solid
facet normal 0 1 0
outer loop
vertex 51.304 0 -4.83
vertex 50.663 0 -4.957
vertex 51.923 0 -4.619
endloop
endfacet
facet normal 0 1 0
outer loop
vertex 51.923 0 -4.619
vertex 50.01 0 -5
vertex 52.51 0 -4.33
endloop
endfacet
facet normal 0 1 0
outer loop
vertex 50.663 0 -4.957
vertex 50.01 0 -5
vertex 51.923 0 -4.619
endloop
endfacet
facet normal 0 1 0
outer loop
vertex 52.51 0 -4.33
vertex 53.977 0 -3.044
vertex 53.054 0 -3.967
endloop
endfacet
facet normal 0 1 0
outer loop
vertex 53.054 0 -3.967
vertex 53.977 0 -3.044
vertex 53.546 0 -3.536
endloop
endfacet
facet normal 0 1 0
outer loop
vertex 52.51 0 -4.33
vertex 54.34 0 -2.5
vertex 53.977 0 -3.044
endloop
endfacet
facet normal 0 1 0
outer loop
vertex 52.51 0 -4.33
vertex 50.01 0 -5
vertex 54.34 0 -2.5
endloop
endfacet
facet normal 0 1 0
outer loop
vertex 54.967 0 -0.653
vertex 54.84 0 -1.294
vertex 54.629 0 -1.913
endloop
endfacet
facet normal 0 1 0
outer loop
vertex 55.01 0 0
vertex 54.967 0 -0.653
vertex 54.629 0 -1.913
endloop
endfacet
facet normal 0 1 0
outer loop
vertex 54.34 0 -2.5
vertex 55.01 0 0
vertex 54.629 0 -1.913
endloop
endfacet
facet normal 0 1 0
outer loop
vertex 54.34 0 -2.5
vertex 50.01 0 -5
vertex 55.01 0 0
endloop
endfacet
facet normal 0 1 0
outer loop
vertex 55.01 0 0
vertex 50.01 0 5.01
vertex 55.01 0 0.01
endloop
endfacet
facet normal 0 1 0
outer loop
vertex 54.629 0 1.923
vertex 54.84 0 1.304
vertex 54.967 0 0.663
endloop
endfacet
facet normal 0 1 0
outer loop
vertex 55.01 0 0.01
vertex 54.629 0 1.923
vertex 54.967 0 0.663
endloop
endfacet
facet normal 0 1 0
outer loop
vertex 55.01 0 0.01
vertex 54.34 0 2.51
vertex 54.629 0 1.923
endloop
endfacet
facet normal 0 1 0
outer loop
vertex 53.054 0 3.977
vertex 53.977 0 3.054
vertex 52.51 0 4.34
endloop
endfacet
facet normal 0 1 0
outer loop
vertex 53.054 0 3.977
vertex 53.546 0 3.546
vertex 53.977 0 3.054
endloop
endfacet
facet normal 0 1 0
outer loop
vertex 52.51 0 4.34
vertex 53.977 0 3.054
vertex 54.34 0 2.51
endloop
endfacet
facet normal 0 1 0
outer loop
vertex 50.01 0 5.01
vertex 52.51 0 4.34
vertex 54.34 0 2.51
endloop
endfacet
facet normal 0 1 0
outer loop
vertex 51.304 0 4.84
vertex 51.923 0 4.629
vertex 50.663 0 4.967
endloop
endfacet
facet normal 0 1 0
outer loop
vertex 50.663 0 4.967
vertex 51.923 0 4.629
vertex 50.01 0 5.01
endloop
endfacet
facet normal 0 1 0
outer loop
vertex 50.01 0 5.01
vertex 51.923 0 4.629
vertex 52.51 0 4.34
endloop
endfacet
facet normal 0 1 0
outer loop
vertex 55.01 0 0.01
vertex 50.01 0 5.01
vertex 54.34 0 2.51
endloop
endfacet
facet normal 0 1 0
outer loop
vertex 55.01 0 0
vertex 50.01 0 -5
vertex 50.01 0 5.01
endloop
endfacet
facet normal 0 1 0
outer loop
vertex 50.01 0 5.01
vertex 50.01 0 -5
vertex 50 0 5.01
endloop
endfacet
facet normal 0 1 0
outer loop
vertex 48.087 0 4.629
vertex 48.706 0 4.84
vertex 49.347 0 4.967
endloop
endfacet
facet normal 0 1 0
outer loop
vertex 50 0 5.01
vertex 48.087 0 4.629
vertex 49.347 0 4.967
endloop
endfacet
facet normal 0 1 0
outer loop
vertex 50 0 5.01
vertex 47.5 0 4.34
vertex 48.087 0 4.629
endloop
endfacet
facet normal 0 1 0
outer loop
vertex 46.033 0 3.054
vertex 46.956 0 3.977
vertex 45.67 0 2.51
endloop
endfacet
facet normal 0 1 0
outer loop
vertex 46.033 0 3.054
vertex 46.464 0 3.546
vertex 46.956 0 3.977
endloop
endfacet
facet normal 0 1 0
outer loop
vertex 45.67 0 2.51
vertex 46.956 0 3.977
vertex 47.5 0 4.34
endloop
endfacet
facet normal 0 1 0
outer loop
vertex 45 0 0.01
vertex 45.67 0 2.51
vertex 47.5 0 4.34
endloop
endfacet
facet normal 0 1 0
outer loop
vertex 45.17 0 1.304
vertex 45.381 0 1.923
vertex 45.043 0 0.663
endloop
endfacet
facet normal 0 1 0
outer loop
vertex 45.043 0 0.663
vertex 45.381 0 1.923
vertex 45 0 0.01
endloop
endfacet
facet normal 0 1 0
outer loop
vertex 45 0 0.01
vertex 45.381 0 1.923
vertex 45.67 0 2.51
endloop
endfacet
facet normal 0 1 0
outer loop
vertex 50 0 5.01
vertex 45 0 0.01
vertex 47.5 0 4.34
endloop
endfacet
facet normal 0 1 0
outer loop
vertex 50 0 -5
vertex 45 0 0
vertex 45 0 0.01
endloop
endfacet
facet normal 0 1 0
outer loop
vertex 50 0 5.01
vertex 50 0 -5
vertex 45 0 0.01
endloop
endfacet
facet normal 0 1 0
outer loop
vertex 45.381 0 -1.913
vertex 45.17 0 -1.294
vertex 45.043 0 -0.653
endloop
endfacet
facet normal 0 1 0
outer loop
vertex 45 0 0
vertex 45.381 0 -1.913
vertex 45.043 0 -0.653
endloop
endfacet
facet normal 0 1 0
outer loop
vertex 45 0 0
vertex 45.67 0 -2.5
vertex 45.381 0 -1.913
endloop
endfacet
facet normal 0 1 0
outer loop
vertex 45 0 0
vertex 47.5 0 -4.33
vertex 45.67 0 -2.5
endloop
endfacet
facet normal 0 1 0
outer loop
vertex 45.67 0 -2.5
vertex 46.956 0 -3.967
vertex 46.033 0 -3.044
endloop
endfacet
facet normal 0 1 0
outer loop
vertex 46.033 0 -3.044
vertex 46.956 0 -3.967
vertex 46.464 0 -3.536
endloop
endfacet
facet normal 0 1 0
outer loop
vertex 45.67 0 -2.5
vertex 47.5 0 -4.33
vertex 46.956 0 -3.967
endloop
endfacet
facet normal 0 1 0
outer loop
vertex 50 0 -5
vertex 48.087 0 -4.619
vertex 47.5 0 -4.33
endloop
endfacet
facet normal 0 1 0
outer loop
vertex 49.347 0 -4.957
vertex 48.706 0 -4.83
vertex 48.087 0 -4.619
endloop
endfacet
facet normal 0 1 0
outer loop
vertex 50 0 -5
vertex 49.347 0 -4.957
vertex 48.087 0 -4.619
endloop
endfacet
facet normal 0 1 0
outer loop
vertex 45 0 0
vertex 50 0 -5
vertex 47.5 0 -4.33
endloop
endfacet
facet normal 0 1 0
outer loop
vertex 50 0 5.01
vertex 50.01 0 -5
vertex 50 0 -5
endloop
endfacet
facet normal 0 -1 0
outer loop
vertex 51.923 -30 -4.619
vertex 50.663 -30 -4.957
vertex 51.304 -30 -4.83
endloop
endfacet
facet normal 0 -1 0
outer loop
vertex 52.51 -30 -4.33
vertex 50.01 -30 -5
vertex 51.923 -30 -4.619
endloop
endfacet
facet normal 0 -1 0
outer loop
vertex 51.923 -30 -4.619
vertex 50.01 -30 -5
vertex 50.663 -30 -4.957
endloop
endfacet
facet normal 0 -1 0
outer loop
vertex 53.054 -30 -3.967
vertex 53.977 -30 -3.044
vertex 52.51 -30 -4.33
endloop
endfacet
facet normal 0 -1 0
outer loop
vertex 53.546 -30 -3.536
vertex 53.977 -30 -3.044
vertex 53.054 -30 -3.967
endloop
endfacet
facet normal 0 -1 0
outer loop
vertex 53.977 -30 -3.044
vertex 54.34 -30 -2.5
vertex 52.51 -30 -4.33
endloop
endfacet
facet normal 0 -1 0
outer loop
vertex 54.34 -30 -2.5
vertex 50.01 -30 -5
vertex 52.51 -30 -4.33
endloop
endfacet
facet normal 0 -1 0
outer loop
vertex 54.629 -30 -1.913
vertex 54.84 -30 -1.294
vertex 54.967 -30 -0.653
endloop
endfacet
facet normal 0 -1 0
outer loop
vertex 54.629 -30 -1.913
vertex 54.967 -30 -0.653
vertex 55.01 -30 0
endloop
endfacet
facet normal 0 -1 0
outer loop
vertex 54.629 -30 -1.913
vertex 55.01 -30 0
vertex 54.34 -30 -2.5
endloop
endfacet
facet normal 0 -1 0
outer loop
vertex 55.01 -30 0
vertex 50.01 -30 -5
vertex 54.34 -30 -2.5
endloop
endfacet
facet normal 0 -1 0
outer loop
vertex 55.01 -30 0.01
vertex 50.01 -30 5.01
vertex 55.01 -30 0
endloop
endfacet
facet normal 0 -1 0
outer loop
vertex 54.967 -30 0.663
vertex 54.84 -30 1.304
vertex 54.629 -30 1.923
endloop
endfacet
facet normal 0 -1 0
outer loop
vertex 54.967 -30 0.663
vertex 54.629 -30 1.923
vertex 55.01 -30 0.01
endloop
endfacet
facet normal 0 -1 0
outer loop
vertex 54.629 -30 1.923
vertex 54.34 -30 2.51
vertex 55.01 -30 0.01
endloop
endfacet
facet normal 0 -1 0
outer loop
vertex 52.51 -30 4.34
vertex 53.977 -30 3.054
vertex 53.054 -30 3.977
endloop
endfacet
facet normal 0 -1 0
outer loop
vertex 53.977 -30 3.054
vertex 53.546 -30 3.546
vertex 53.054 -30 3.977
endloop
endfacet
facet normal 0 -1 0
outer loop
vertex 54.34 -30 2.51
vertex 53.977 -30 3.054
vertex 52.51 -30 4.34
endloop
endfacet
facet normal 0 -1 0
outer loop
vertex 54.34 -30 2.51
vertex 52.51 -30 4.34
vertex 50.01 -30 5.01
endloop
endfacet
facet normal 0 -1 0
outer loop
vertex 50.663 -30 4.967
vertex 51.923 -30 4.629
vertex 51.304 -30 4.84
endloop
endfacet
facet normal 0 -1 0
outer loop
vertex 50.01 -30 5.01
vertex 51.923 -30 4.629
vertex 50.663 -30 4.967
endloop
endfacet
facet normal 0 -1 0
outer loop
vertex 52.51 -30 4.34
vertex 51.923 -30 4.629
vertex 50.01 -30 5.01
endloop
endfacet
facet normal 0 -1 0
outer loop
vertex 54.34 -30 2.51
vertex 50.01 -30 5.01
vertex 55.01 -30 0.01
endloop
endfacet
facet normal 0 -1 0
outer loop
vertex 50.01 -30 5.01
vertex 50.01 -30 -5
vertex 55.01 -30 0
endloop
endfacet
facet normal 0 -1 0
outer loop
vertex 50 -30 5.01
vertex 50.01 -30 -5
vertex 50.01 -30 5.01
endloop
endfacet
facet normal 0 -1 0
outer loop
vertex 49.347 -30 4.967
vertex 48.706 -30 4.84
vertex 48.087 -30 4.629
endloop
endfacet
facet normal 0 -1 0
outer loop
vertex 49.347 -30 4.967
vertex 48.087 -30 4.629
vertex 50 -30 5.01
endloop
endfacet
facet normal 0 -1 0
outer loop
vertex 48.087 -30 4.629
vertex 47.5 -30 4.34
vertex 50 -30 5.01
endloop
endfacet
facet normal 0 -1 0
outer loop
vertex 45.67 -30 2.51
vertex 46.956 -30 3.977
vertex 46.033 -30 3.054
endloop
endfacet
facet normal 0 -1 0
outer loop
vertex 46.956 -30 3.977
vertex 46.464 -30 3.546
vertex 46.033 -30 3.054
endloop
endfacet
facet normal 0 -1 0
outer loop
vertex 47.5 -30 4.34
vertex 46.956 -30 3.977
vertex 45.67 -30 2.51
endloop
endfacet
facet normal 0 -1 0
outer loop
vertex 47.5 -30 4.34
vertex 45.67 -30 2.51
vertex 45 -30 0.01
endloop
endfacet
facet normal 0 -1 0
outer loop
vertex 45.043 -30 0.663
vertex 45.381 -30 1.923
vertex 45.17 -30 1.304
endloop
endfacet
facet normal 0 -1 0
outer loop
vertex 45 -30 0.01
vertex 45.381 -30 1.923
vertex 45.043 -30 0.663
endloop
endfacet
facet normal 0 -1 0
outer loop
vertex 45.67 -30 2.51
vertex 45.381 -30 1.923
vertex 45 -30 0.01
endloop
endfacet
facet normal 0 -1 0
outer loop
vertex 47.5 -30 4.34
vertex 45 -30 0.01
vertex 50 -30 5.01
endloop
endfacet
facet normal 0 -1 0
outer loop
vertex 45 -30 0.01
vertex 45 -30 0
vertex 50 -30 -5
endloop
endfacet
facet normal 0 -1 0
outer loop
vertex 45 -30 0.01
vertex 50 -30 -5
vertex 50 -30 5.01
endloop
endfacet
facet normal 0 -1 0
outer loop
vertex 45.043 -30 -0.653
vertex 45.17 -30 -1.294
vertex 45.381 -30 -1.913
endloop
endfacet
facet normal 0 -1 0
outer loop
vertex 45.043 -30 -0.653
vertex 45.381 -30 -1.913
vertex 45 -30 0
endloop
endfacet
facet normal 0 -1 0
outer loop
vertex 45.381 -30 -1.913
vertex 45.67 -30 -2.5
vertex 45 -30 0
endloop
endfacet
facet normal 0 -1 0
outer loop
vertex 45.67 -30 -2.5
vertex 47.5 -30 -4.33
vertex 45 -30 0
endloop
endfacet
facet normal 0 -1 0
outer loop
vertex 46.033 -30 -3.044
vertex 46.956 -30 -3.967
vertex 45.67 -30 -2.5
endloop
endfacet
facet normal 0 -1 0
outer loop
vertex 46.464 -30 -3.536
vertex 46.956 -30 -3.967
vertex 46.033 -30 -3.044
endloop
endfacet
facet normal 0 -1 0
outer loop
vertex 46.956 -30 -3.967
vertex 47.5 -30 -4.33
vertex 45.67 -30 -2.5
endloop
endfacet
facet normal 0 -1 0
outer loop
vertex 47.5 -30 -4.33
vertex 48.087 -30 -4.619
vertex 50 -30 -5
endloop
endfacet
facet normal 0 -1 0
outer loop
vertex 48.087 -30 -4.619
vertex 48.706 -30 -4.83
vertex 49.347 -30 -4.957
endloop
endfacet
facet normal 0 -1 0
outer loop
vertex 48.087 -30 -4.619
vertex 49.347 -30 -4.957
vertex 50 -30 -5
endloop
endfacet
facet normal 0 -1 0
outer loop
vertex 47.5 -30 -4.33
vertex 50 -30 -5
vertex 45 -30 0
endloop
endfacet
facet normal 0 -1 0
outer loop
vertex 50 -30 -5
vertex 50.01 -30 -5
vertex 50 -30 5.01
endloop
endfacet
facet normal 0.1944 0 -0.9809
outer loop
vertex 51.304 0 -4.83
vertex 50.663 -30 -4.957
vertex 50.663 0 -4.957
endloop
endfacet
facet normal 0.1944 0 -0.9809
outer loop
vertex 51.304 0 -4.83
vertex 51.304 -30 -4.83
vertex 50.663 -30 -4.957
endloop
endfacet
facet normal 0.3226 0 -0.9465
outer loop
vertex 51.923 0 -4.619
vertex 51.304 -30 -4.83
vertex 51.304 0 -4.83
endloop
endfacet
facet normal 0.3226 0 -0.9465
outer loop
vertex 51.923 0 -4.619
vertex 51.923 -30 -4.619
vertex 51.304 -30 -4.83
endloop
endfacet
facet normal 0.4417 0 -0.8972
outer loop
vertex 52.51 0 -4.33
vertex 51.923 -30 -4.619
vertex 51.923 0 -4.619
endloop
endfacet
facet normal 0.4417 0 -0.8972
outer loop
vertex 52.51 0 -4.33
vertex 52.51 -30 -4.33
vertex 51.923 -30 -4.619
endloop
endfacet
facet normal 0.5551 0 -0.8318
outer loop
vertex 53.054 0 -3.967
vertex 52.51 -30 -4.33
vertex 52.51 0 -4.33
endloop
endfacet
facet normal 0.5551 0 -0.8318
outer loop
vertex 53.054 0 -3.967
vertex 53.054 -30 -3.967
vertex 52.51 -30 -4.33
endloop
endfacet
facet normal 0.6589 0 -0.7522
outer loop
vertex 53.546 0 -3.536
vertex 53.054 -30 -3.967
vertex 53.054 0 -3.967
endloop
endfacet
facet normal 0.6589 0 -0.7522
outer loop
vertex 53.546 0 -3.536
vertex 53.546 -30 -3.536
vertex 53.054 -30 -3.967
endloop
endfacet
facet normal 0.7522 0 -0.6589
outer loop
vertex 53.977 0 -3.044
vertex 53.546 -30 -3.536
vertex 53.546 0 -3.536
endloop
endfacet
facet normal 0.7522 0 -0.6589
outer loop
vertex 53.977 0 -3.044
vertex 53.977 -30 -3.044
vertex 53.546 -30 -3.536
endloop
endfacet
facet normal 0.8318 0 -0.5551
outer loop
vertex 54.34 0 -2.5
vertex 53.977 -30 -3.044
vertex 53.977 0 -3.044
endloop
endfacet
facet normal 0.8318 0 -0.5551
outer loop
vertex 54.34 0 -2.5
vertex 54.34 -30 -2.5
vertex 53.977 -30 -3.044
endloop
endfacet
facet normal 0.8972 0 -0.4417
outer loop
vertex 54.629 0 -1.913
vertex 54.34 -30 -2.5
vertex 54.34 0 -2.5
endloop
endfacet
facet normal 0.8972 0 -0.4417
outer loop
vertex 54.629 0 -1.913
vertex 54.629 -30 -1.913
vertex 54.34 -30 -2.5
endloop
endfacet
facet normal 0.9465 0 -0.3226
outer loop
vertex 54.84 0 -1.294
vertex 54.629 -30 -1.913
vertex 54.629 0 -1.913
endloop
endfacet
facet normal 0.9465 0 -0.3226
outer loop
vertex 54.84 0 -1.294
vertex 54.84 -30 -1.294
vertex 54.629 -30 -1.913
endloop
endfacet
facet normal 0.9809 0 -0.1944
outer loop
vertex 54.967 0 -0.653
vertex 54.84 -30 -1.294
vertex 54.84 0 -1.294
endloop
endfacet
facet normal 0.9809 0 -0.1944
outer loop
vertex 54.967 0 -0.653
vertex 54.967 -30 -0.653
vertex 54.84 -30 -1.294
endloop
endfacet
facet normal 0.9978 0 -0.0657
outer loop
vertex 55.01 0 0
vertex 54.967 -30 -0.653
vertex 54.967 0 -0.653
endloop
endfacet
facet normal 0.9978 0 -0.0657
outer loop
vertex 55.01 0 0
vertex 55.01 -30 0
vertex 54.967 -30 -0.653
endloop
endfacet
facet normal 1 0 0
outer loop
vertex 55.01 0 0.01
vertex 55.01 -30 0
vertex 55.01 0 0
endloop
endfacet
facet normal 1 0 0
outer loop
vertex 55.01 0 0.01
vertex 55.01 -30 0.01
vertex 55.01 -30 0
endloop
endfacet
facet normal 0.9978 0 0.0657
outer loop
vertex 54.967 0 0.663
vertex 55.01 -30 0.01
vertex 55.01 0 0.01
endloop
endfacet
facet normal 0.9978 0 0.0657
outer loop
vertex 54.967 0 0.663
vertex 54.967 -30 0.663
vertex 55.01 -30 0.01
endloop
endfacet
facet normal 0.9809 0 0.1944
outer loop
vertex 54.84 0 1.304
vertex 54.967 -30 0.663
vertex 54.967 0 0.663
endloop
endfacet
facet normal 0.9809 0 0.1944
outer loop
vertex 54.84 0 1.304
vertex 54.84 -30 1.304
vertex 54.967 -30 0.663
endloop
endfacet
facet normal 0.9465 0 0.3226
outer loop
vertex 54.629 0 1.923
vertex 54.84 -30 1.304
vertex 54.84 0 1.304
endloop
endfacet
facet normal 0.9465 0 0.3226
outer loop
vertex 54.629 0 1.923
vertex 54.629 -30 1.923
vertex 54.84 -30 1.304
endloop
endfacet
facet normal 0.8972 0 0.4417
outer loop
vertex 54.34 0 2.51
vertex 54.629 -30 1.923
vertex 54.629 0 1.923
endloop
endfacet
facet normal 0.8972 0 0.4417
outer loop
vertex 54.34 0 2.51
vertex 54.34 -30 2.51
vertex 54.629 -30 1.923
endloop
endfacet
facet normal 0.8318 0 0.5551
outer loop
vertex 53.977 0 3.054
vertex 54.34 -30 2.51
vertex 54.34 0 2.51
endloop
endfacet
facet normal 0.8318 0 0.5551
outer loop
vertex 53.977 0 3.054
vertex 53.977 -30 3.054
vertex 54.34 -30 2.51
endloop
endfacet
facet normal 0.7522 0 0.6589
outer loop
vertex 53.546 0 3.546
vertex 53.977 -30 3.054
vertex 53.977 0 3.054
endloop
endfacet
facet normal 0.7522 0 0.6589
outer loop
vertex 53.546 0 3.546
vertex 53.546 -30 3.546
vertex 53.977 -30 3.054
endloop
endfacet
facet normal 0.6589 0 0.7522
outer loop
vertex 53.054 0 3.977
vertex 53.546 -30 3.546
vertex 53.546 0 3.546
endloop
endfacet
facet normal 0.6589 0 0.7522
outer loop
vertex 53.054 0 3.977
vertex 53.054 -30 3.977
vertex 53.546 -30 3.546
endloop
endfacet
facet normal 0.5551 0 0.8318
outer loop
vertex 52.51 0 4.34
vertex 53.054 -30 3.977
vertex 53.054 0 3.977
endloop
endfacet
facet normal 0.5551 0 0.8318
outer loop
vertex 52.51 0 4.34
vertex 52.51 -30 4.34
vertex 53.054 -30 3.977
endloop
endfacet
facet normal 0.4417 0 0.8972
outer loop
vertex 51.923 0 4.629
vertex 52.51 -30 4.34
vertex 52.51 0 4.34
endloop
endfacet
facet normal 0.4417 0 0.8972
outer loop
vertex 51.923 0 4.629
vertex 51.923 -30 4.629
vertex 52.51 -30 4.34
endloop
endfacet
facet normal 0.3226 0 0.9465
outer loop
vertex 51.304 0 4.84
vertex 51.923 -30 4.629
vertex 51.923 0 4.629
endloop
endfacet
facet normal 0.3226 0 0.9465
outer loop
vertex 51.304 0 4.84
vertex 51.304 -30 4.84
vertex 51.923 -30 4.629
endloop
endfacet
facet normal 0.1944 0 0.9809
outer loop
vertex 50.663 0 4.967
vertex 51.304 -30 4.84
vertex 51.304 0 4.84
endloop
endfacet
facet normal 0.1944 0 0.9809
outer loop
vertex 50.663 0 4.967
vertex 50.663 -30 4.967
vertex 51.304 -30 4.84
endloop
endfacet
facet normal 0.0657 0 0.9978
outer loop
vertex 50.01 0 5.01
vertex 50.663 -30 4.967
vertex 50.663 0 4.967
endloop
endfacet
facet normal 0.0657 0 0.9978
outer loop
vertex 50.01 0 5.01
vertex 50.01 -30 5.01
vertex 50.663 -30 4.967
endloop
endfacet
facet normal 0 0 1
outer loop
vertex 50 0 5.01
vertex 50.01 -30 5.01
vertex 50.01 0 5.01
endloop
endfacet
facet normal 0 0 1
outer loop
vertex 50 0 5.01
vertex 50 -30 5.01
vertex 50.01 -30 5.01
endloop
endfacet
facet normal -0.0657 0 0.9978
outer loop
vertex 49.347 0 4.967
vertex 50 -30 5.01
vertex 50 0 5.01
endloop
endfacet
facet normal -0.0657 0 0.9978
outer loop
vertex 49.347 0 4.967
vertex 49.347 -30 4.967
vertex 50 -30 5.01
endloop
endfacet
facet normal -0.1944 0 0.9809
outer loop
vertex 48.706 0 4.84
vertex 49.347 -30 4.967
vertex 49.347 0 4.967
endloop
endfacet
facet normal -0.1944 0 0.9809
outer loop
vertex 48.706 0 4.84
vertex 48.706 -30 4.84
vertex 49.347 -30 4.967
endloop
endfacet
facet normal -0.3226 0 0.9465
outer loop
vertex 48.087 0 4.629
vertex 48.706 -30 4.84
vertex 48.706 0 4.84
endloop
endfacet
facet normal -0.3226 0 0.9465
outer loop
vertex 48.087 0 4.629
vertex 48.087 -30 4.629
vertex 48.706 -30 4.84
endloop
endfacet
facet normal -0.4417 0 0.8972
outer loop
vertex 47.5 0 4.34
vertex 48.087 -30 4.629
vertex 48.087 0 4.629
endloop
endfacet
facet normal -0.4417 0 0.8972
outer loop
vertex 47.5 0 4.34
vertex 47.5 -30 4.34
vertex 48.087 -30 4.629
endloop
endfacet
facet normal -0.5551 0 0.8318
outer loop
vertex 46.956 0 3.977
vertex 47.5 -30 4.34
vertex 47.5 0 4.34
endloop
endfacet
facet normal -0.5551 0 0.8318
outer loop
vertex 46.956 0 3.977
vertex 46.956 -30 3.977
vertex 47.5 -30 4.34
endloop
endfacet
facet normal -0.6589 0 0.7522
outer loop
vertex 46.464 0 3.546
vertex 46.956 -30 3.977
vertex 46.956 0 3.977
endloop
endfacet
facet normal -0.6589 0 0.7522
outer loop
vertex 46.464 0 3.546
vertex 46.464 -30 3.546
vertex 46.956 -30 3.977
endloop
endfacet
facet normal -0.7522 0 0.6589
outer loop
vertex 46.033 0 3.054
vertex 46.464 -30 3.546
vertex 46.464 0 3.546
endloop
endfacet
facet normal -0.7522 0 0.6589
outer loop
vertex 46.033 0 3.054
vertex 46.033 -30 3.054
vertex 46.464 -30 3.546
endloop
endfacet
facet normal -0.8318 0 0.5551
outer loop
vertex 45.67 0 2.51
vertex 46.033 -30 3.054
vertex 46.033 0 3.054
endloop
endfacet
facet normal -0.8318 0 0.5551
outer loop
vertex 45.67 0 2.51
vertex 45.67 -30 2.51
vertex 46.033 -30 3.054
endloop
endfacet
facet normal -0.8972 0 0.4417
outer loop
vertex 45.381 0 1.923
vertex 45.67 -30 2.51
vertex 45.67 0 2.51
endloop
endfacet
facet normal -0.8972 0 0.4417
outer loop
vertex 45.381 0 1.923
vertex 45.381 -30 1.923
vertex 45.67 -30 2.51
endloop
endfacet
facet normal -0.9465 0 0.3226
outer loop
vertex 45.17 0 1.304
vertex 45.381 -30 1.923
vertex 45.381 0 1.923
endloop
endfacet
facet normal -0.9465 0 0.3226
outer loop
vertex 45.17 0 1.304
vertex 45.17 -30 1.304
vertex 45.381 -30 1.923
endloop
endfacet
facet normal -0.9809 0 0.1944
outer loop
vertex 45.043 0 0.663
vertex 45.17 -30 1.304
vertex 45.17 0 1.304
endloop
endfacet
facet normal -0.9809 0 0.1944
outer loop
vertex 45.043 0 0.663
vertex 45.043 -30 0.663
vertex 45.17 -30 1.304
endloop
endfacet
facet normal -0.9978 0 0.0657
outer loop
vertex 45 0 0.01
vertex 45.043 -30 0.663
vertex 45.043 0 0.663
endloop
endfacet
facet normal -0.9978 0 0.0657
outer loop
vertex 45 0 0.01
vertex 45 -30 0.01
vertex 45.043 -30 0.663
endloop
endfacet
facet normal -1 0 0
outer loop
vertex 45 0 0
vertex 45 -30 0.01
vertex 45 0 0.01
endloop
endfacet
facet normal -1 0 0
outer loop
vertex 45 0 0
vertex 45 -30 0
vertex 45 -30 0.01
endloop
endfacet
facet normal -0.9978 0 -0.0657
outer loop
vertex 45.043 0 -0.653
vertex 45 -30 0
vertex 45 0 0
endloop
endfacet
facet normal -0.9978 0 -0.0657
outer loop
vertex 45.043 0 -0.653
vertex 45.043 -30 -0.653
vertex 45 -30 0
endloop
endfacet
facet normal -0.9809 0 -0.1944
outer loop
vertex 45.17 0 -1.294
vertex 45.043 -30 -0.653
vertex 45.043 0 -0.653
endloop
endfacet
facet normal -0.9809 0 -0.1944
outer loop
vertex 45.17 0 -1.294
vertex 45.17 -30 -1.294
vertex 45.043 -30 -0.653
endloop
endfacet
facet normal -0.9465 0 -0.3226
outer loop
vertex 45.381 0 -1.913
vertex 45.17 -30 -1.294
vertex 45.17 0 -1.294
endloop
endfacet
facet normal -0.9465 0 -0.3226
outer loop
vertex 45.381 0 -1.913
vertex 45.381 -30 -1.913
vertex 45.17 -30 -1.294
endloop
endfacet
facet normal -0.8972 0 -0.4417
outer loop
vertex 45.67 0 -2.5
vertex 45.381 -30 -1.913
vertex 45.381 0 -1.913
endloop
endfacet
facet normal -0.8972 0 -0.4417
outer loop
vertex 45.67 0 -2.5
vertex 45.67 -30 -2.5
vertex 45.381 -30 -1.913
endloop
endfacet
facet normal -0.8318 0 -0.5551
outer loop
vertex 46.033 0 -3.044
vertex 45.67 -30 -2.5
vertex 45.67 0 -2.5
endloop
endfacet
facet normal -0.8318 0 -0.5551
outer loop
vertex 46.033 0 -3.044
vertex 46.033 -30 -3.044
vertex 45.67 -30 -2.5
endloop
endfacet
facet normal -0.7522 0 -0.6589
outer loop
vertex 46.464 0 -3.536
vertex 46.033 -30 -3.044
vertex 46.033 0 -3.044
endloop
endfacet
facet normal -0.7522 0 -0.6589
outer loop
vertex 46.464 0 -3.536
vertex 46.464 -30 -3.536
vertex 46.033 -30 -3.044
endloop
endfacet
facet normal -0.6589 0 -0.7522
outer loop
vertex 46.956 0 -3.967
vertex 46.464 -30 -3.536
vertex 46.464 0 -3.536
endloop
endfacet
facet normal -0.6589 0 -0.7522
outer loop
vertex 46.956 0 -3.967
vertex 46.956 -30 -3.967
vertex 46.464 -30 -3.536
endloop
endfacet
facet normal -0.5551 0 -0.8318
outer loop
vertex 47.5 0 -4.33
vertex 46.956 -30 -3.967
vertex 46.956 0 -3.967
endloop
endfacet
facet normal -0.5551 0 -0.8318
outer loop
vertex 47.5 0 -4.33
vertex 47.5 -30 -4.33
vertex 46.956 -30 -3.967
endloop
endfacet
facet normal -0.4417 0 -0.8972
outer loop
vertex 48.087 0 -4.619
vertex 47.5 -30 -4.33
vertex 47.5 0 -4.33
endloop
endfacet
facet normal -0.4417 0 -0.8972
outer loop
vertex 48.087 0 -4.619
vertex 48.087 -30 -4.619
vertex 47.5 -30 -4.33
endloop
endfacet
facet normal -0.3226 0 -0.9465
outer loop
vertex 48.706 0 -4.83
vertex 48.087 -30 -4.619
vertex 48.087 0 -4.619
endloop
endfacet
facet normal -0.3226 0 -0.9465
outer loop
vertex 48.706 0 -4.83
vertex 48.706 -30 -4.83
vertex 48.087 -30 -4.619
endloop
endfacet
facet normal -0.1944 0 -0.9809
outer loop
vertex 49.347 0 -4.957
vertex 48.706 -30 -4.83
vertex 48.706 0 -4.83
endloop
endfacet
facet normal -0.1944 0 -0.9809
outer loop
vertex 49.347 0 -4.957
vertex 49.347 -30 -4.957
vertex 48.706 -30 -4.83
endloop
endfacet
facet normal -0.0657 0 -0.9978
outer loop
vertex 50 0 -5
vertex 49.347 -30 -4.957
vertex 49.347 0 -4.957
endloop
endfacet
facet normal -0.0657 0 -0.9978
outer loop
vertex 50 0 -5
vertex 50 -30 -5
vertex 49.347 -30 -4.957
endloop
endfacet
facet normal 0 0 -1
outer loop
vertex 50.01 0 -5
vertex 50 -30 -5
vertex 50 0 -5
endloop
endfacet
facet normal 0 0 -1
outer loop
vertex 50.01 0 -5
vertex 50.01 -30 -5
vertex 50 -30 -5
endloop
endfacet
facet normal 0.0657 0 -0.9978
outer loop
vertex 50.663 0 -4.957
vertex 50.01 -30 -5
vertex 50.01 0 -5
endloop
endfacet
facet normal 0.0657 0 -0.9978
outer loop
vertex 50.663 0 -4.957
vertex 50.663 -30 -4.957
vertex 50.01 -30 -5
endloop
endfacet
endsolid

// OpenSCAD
// Generated by SolidPython 1.1.3 on 2022-06-02 20:57:53
$fn = 48;


translate(v = [50, 0, 0]) {
	rotate(a = [90, 0, 0]) {
		linear_extrude(height = 30) {
			offset(r = 5) {
				square(size = [0.0100000000, 0.0100000000]);
			}
		}
	}
}
/***********************************************
*********      SolidPython code:      **********
************************************************
 

from solid import scad_render_to_file

import OPSC_dimensions as od
from OPSC_insert import oi
from OPSC_dimensions import setMode

#from solid.objects import cube, cylinder, difference, translate, union

#import os, solid; print(os.path.dirname(solid.__file__) + '/examples')

od.setMode("3DPR")
#od.sertMode("LAZE")




a = (oi("cube",x=10,y=20,z=30,width=100,height=200,depth=300))
a = oi("cubeRounded",rotX=90,x=50,width=10,height=10,depth=30)


fileName = "OPSC_working.scad"

file_out = scad_render_to_file(a, fileName, file_header=f'$fn = 48;')
 
 
************************************************/
